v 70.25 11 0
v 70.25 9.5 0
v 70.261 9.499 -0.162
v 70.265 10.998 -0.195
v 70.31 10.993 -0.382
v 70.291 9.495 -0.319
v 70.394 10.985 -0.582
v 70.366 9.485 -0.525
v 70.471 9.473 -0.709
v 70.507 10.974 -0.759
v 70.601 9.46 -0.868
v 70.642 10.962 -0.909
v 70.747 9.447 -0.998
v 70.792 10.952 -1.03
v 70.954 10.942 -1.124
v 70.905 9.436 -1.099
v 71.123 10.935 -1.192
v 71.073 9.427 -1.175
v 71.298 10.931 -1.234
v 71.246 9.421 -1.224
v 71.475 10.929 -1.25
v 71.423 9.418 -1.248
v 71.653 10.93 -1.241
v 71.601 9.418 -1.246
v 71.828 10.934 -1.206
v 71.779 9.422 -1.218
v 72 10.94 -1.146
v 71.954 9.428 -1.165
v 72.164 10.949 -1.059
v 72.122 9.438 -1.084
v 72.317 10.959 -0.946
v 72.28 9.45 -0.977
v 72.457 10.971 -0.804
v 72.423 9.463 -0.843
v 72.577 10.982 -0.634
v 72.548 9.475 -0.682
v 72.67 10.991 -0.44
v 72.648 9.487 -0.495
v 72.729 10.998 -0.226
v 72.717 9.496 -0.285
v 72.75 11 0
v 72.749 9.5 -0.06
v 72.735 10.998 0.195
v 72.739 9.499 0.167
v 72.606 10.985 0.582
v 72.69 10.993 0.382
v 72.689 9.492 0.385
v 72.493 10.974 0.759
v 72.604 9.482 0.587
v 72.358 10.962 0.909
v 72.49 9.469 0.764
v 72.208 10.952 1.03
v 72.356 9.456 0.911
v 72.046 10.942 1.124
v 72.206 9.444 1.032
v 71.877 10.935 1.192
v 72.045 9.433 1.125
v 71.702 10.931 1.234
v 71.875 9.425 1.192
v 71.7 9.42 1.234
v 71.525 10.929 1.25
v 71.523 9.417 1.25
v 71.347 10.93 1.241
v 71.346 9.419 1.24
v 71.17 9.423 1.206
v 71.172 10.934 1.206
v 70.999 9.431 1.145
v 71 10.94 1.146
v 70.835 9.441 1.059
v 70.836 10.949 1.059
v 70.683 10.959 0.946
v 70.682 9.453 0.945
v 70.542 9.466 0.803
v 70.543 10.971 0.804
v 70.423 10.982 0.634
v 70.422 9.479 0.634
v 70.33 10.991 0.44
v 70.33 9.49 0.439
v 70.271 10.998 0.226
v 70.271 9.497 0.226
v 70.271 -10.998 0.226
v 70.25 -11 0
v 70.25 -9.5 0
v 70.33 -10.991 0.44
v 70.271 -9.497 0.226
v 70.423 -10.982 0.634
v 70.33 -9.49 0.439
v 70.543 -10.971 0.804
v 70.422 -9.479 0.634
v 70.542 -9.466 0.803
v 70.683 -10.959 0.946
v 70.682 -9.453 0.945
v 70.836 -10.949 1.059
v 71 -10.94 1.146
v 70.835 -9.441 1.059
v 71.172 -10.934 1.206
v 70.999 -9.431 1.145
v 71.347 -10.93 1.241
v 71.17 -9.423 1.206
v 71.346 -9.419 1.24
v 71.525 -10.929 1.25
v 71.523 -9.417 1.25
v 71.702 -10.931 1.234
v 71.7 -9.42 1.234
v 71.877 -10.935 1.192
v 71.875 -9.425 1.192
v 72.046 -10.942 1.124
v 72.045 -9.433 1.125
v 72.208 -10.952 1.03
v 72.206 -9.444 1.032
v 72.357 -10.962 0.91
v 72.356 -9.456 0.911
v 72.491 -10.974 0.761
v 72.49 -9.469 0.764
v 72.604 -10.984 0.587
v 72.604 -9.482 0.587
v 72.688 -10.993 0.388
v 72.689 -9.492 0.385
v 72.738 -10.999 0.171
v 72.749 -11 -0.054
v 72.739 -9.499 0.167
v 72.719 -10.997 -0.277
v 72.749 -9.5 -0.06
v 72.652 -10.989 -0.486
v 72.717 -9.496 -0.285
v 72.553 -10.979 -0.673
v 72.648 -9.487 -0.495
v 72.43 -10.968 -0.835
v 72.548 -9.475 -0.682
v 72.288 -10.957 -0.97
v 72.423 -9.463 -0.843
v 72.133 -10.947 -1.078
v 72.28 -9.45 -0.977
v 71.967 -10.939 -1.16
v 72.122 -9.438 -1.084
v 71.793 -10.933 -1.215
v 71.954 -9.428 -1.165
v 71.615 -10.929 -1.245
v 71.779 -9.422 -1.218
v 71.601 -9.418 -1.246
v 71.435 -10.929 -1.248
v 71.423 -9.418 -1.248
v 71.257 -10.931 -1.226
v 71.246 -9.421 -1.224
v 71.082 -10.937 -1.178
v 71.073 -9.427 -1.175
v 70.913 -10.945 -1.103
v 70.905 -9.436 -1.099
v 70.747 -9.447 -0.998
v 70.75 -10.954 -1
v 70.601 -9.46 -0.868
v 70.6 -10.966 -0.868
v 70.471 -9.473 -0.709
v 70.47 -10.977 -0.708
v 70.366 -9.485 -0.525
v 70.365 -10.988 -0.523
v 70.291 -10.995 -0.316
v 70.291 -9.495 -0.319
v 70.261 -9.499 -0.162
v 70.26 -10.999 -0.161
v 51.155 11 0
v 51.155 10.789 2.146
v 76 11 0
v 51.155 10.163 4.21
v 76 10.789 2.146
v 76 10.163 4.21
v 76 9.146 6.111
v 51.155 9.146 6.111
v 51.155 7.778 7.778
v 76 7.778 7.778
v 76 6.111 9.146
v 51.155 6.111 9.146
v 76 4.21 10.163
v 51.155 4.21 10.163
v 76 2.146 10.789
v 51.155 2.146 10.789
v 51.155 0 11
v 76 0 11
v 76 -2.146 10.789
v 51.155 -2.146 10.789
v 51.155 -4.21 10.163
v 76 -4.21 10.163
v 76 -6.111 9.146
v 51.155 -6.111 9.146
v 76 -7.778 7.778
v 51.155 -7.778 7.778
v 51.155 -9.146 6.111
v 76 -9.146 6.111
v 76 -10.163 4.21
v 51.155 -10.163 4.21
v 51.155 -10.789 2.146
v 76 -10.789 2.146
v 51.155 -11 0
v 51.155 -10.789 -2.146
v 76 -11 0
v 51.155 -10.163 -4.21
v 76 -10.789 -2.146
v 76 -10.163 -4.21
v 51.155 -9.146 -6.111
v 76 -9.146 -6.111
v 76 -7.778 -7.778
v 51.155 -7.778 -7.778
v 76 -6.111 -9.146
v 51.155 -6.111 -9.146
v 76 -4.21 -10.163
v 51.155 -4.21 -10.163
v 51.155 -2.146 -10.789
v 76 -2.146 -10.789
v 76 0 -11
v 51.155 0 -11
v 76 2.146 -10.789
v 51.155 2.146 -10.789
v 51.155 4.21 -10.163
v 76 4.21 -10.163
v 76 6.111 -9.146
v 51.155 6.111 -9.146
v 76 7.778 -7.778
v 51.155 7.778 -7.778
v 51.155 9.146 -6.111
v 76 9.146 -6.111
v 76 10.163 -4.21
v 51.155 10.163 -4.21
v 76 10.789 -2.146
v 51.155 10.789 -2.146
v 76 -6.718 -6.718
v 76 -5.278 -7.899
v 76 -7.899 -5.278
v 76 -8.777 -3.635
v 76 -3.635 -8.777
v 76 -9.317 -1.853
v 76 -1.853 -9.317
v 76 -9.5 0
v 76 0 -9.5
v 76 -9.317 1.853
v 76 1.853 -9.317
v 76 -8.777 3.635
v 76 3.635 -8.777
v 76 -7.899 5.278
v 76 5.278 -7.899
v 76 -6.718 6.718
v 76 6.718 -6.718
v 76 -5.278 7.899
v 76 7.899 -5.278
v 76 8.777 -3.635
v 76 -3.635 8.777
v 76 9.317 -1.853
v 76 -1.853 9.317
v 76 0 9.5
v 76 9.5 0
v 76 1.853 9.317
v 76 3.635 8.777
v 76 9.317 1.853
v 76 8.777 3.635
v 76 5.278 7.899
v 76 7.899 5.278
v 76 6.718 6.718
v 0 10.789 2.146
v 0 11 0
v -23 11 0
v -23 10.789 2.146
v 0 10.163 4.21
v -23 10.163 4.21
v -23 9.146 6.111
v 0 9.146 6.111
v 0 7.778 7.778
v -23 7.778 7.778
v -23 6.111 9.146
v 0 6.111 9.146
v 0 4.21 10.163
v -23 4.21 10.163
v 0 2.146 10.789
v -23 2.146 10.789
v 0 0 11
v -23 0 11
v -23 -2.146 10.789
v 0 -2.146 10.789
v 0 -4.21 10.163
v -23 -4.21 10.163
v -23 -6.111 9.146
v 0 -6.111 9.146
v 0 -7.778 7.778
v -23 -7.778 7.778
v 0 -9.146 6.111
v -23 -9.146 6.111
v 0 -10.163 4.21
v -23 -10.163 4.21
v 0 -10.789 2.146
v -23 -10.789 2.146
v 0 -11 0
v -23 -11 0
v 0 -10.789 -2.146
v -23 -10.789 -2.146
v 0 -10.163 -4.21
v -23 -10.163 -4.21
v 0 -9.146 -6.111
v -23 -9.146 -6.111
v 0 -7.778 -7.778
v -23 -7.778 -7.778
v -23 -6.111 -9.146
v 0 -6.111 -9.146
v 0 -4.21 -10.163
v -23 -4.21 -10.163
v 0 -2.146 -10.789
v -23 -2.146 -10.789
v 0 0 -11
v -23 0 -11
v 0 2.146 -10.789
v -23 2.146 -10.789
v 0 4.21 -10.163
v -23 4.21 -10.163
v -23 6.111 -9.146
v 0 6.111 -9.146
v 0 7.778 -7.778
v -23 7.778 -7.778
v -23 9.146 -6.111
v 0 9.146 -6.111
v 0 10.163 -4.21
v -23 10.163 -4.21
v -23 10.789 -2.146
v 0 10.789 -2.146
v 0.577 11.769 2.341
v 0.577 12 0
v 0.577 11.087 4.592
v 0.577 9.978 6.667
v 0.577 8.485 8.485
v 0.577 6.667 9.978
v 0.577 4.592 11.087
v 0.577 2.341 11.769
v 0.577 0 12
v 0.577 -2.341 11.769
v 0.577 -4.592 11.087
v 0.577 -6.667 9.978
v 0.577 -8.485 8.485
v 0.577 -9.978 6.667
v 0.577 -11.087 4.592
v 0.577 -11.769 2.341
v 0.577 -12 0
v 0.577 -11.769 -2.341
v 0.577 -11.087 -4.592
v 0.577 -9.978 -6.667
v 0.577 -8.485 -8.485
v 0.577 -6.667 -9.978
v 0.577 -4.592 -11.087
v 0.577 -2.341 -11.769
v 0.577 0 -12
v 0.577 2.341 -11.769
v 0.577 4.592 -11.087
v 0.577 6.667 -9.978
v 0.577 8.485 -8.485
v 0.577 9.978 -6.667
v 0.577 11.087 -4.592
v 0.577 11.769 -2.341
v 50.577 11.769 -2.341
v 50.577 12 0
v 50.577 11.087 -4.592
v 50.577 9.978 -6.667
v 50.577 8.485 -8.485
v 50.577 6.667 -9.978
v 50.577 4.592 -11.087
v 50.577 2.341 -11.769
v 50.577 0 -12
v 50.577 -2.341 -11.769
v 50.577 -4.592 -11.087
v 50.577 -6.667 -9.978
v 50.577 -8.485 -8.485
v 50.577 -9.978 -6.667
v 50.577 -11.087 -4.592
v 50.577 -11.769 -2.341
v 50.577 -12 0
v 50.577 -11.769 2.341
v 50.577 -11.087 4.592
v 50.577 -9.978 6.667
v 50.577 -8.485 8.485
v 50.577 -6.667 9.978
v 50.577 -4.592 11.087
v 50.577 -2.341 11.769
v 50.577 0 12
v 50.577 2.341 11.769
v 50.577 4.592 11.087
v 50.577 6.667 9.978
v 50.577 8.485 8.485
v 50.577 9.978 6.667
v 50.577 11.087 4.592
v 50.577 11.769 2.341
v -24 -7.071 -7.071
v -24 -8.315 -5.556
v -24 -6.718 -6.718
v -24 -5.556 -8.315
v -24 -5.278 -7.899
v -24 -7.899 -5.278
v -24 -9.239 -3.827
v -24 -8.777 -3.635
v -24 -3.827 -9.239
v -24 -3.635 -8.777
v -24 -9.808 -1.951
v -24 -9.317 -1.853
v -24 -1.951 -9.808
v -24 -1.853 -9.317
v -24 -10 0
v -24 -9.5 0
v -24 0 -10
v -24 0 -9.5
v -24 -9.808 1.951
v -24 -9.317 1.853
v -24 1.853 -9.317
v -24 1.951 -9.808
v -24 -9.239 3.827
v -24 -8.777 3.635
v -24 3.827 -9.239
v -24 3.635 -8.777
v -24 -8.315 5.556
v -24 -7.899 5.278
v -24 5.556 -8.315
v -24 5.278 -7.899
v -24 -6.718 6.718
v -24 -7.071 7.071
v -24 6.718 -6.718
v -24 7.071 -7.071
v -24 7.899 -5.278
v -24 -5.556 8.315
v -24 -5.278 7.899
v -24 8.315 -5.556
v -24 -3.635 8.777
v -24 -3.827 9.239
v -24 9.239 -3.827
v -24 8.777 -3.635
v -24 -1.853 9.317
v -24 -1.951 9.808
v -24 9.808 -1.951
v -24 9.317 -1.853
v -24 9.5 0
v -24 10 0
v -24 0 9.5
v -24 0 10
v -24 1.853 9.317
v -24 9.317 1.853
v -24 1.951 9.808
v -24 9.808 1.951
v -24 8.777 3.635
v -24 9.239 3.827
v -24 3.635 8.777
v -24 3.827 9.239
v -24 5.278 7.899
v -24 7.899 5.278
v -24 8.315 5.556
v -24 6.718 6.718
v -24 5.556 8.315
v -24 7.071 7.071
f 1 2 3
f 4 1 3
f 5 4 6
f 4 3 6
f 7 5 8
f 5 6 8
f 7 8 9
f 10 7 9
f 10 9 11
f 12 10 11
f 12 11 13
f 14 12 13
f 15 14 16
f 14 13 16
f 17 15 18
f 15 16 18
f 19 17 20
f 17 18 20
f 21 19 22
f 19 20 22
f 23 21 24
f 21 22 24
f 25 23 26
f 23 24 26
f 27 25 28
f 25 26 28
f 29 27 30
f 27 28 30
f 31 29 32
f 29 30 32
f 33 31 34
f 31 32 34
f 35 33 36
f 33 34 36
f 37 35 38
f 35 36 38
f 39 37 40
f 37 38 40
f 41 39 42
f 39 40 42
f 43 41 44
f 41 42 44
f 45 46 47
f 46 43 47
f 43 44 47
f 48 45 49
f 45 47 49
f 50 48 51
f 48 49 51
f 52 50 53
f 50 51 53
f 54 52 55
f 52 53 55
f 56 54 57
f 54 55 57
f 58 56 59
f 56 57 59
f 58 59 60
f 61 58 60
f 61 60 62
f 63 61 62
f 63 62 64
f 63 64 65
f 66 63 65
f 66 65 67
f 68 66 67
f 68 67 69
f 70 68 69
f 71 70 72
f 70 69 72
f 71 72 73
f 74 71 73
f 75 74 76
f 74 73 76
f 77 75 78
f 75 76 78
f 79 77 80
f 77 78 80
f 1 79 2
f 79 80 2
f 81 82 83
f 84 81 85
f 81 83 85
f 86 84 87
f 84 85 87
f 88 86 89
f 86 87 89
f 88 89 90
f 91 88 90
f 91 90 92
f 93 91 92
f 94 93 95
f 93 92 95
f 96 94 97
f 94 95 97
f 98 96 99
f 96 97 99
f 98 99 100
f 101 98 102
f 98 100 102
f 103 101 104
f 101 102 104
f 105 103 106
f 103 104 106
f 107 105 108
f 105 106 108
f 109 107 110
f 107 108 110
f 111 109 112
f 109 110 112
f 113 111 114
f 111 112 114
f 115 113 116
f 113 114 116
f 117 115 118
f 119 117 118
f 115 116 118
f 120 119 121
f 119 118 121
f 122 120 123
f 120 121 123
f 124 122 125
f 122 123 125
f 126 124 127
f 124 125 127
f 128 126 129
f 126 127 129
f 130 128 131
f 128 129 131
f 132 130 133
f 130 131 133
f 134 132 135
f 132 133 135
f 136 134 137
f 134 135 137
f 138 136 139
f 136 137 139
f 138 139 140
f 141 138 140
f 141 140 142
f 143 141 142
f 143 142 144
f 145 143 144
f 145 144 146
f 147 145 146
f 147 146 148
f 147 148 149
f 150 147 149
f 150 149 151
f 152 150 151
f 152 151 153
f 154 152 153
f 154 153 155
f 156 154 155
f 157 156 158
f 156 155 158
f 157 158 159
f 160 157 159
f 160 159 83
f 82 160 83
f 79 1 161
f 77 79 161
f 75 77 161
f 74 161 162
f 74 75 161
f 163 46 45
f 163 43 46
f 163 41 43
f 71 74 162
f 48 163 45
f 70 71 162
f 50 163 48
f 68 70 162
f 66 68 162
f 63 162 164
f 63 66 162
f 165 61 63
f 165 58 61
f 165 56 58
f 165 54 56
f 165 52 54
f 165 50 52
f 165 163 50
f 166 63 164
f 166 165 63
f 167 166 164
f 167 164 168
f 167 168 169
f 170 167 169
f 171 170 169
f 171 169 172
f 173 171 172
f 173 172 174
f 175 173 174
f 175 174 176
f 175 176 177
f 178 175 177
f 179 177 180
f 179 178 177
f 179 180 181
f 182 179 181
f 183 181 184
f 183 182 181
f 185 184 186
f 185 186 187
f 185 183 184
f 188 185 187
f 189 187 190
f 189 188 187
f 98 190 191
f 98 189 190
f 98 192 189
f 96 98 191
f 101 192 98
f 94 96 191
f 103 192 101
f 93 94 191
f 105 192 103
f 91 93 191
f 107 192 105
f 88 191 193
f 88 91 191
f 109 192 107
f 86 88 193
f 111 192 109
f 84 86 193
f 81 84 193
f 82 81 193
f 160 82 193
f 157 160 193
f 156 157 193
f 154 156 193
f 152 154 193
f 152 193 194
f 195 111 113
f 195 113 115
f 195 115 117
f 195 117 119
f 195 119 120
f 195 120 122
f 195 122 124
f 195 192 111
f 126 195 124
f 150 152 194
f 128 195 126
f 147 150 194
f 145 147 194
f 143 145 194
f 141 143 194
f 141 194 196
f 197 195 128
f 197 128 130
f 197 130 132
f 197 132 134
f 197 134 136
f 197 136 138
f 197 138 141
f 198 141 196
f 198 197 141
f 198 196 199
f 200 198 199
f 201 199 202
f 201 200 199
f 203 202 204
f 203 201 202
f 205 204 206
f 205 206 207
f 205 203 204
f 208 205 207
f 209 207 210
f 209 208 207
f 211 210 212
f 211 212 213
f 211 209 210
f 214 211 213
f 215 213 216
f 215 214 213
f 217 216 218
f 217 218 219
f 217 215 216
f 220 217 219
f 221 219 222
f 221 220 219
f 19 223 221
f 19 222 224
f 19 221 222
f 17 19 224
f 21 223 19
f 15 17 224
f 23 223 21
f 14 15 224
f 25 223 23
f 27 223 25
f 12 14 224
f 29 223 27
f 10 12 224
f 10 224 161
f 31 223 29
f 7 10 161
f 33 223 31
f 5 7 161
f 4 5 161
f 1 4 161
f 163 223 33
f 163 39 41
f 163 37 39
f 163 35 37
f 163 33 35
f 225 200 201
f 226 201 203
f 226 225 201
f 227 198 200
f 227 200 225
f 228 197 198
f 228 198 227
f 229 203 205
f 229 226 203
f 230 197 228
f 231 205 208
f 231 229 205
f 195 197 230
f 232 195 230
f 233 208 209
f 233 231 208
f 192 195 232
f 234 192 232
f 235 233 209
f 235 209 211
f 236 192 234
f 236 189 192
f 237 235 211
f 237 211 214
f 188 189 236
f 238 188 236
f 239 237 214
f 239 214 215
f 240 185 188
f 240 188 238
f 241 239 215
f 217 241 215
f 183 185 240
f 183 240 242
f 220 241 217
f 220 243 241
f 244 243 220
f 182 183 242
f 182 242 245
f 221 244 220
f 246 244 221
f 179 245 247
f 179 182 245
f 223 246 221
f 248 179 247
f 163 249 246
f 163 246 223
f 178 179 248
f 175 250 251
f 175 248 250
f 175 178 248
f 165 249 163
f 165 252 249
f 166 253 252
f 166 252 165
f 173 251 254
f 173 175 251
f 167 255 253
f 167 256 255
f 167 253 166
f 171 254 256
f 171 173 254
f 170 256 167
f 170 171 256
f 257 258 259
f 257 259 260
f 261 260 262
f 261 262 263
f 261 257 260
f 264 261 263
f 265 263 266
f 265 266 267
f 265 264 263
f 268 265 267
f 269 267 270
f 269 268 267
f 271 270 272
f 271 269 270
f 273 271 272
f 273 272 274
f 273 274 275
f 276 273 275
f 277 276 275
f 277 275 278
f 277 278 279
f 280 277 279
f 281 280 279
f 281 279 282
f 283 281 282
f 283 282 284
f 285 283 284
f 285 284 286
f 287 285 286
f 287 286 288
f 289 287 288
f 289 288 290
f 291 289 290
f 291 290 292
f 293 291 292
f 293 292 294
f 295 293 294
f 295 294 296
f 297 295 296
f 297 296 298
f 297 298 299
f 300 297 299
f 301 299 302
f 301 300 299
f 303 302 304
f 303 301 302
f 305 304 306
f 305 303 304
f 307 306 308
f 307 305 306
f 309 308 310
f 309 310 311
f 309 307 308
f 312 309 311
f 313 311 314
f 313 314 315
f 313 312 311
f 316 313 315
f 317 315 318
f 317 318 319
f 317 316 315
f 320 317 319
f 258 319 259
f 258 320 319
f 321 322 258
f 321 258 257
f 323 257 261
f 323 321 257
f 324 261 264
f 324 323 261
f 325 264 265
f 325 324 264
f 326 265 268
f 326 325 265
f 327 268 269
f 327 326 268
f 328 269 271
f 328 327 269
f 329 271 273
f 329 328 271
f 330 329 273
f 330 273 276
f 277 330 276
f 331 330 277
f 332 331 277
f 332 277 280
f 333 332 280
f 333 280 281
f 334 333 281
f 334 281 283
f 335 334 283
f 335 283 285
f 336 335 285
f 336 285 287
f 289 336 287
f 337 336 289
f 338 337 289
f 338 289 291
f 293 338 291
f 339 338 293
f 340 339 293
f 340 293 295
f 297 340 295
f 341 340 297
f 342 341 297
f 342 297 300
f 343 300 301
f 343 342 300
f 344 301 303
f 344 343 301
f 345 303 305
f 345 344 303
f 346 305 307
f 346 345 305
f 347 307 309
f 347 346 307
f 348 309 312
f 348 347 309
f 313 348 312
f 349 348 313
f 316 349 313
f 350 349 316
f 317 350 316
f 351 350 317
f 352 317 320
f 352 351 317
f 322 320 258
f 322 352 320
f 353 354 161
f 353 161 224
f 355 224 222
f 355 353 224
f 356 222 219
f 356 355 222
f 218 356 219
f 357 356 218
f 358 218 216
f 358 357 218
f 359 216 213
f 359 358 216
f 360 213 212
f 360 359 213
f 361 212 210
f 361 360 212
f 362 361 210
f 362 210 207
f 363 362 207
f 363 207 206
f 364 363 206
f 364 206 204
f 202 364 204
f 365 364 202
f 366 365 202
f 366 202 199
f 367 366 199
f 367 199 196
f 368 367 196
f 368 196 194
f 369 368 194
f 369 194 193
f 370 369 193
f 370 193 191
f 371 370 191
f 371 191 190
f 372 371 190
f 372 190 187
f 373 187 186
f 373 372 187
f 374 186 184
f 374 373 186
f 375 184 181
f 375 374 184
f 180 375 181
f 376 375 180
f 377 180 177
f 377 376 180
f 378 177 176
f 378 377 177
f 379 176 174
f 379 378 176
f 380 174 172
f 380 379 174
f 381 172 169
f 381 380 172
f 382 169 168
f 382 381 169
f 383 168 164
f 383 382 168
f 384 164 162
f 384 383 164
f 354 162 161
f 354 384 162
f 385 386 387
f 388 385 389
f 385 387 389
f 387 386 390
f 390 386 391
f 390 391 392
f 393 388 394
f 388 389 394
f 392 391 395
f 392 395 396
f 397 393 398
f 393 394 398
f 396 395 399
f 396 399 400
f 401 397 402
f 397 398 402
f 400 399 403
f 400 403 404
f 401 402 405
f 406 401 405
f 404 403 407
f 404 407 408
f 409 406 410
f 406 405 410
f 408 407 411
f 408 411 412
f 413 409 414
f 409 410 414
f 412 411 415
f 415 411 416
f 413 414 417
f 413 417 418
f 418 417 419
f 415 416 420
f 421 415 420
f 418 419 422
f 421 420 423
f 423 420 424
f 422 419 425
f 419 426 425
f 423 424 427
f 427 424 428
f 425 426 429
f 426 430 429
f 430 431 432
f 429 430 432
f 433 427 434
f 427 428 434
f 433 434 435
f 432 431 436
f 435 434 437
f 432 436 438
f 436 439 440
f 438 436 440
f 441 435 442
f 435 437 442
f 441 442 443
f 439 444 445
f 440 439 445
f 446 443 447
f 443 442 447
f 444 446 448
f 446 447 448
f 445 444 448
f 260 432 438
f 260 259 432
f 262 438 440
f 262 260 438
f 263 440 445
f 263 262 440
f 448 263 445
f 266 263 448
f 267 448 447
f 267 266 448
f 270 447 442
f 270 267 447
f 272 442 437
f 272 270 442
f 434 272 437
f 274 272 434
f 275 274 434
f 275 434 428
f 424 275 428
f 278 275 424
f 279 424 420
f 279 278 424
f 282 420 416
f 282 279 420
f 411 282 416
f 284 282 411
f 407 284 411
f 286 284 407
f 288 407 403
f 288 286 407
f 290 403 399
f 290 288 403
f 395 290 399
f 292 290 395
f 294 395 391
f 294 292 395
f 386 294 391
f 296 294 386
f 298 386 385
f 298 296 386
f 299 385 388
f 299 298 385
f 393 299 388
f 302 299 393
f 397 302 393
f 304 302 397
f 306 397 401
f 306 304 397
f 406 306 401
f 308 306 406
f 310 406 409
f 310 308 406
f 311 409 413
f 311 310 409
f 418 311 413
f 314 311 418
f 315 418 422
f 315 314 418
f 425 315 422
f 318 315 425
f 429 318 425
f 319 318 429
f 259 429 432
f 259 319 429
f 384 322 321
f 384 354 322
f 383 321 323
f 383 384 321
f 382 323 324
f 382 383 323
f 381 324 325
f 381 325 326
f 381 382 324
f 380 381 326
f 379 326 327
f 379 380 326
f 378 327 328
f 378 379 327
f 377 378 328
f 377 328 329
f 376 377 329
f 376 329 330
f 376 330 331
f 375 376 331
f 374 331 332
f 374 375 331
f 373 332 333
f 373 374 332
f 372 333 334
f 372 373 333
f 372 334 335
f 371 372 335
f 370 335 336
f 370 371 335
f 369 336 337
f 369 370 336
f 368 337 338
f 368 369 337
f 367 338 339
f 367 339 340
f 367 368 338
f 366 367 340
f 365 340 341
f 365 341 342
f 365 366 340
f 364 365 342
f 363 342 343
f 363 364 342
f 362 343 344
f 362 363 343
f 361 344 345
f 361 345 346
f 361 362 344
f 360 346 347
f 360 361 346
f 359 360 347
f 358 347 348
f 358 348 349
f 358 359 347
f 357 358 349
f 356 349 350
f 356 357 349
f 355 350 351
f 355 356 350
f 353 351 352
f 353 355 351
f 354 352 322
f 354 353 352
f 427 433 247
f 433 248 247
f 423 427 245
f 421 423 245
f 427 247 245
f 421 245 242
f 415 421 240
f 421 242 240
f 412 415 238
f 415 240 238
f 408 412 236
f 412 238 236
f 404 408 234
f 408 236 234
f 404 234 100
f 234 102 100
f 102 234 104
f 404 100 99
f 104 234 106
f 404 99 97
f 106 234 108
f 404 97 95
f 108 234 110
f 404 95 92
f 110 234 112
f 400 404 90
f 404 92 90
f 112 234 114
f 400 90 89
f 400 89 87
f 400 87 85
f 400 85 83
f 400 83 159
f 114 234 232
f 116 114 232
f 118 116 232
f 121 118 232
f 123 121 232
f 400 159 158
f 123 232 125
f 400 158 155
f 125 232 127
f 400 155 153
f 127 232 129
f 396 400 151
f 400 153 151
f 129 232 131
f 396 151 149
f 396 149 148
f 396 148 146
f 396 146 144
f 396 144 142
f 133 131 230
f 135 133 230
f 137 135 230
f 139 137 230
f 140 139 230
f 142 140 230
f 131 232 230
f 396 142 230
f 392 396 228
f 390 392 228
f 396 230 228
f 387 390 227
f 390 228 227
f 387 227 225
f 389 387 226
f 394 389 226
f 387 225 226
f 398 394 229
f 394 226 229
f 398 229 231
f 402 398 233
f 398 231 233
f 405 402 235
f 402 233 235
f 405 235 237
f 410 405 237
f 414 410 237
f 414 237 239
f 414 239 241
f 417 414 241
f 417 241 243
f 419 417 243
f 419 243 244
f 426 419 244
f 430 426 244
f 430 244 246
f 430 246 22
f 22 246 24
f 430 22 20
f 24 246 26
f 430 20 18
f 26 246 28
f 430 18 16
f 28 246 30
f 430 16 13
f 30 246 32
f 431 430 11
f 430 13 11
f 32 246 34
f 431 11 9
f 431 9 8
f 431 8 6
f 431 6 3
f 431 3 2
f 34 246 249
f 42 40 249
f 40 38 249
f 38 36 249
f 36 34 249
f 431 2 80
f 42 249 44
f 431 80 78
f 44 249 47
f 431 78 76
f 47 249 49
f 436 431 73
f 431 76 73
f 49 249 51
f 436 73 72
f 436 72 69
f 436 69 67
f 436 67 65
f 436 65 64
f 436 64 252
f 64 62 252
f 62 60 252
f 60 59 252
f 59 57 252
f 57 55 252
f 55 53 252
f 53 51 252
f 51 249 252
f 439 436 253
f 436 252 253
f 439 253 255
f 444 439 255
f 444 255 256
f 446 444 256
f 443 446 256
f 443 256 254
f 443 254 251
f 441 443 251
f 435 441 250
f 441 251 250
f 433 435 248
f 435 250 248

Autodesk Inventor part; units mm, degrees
ref_plane "YZ Plane" through (0, 0, 0) normal (1, 0, 0) x (0, 1, 0)
ref_plane "XZ Plane" through (0, 0, 0) normal (0, 1, 0) x (-1, 0, 0)
ref_plane "XY Plane" through (0, 0, 0) normal (0, 0, 1) x (1, 0, 0)
sketch "Profile" plane through (0, 0, 0) normal (0, 0, 1) x (1, 0, 0)
  line L0 (-24, 0) -> (-24, 11)
  line L1 (-24, 11) -> (0, 11)
  line L2 (0, 11) -> (0.5774, 12)
  line L3 (0.5774, 12) -> (50.5774, 12)
  line L4 (50.5774, 12) -> (51.1547, 11)
  line L5 (51.1547, 11) -> (76, 11)
  line L6 (76, 11) -> (76, 0)
  line L7 (-24, 0) -> (0, 0)
  line L8 (0, 0) -> (0, 9)
  line L9 (0, 9) -> (68, 9)
  line L10 (68, 9) -> (68, 0)
  line L11 (68, 0) -> (76, 0)
  line L12 (-44, 0) -> (96, 0) construction
  line L13 (0, 11) -> (0, 9) construction
  dimension "BodyLength" = 100
  dimension "d1" = 11
  dimension "d3" = 120
  dimension "d4" = 120
  dimension "d5" = 50
  dimension "d6" = 24
  dimension "d16" = 8
  dimension "d29" = 1
  dimension "d30" = 9
revolve "ProfileRevolveFeature" add sketch "Profile" angle 360 about axis through (-10, 0, 0) along (1, 0, 0)
sketch "InsideHole" plane through (-24, 0, 0) normal (-1, 0, 0) x (0, 0, 1)
  circle A0 centre (0, 0) radius 9 construction
hole "InsideHoleFeature" at (-24, 0, 0) direction (1, 0, 0) diameter 19 end through all
chamfer "EndChamferFeature" distance 1 angle 45 1 edges at (-24, -11, 0)
sketch "CapMountHole" plane through (0, 0, 0) normal (0, 1, 0) x (-1, 0, 0)
  line L0 (-76, 11) -> (-76, -11) construction
  line L1 (9.12, 0) -> (-54.72, 0) construction
  circle A0 centre (-71.5, 0) radius 1.25
  point P0 (0, 0)
  dimension "d31" = 4.5
  dimension "d39" = 2.5
extrude "CapMountHoleFeature" cut sketch "CapMountHole" along normal through all both and the other way through all
equation "\"d5\" = 0.5 * BodyLength"
equation "\"d6\" = 0.24 * BodyLength"
properties part number "BackPair1PistonBody"
